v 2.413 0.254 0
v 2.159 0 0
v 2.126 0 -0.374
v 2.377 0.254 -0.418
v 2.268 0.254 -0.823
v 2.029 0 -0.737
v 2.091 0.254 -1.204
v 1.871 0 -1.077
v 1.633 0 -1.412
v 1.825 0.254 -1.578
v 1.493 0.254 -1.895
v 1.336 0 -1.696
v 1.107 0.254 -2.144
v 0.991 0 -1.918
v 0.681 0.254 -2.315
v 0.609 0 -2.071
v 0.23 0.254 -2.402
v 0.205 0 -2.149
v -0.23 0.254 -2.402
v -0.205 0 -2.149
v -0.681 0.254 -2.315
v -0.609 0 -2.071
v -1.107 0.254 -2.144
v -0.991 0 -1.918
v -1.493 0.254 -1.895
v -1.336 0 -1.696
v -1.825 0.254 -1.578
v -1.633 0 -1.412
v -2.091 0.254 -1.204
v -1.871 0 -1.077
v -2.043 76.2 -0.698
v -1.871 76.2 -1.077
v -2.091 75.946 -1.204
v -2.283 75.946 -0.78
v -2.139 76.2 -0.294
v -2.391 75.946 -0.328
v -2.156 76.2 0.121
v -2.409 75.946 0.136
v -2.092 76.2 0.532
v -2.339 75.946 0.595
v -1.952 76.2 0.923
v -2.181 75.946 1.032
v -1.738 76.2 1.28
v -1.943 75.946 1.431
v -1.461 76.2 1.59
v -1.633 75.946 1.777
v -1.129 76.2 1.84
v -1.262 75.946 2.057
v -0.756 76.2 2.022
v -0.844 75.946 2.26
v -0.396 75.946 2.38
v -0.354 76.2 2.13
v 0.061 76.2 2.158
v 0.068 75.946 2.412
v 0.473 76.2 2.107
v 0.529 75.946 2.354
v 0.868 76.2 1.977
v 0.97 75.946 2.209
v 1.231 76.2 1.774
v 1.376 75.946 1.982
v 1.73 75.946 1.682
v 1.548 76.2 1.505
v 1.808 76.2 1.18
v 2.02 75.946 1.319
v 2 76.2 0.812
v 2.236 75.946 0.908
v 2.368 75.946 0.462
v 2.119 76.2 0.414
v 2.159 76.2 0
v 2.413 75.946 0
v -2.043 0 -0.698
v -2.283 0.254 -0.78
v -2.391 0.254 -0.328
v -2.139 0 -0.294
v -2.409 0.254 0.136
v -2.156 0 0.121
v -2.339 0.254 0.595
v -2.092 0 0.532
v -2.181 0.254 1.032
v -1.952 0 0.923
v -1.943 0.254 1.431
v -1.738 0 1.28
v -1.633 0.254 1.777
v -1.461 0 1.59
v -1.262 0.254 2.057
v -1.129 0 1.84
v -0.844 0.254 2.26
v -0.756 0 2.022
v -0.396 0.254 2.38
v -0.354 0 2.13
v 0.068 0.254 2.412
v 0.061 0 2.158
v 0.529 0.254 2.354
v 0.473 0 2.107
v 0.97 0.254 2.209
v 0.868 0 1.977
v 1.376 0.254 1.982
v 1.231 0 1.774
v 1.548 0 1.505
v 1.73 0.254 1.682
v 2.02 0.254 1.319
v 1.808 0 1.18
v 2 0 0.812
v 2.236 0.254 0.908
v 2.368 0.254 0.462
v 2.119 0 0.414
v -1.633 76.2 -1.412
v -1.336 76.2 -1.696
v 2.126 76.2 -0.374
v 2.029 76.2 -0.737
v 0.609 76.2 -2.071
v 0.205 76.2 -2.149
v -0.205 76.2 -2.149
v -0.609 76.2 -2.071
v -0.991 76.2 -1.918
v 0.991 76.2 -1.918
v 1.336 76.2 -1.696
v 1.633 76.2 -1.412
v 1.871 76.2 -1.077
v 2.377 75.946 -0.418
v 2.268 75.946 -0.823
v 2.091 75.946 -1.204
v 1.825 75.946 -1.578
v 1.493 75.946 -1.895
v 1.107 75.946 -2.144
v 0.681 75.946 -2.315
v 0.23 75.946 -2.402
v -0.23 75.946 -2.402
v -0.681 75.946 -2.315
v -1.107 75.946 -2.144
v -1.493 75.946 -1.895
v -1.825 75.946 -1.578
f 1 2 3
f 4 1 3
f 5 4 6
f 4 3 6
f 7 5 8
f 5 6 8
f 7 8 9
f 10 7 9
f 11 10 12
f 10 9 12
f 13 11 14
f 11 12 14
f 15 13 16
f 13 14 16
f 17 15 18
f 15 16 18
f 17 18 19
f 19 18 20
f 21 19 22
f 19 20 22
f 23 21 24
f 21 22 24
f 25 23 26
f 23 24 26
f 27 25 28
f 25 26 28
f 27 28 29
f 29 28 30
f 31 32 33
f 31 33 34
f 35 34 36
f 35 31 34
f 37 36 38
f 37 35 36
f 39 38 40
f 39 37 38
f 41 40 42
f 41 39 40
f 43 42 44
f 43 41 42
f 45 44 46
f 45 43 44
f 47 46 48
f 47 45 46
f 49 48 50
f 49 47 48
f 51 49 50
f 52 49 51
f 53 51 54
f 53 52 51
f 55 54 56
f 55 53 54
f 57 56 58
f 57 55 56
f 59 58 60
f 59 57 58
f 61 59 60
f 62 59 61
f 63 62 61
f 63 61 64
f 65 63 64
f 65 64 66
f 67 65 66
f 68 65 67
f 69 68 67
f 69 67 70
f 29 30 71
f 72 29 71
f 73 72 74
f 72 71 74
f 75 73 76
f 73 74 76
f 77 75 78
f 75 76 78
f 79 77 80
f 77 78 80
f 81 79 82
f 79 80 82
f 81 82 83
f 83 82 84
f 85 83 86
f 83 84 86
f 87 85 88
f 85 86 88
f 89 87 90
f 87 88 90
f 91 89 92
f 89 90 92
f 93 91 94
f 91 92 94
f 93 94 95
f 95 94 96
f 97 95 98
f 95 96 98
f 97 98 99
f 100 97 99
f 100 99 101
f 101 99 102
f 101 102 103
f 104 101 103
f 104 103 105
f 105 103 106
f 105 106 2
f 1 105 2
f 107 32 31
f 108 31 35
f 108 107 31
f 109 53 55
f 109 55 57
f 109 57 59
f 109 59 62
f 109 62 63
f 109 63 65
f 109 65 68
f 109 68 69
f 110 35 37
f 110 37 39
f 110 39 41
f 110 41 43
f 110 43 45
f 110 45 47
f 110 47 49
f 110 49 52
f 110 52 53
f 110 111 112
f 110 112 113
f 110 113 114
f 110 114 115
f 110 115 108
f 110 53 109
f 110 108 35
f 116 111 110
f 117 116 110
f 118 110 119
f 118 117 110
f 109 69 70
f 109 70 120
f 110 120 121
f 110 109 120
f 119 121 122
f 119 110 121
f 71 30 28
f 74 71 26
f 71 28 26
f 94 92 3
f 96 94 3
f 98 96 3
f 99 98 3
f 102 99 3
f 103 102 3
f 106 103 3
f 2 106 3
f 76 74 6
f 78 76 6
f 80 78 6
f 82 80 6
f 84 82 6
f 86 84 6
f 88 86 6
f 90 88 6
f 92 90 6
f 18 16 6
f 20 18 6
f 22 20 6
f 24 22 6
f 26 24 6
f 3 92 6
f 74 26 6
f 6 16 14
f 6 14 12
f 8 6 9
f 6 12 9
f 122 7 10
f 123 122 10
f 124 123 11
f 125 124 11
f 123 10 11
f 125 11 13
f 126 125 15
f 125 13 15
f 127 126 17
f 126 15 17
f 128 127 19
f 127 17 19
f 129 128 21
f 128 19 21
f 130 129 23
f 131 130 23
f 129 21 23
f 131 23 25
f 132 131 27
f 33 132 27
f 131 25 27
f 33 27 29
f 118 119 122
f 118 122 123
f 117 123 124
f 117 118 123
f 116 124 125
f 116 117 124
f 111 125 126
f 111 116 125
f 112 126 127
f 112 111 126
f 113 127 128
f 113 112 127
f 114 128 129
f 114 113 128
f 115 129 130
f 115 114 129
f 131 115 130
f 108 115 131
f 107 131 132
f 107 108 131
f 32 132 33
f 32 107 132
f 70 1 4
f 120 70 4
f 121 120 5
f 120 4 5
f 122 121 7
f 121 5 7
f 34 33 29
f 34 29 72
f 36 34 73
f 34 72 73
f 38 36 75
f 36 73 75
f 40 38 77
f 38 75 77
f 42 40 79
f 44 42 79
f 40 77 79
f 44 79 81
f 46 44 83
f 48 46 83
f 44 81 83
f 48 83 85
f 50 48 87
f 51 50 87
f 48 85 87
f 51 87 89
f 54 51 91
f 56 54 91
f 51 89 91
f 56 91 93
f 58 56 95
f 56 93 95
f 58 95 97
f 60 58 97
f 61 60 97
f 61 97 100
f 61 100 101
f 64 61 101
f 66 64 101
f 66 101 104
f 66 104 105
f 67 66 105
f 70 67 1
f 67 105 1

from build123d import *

# Parameters (mm, degrees)
BOSS_EXTRUDE1_DEPTH = 76.2
CHAMFER1_SIZE       = 0.254


with BuildPart() as part:
    # Sketch1 → Boss-Extrude1 (new body)
    with BuildSketch(Plane(origin=(0, 0, 0), x_dir=(1, 0, 0), z_dir=(0, 1, 0))):
        with BuildLine():
            ThreePointArc((2.091397583, 1.203588447), (0, 2.413), (-2.091397583, 1.203588447))
            Line((-2.091397583, 1.203588447), (2.091397583, 1.203588447))
        make_face()
        with BuildLine():
            Line((2.091397583, 1.203588447), (-2.091397583, 1.203588447))
            ThreePointArc((-2.091397583, 1.203588447), (-0.622907149, -2.33121335), (2.413, 0))
            ThreePointArc((2.413, 0), (2.33121335, 0.622907149), (2.091397583, 1.203588447))
        make_face()
    extrude(amount=BOSS_EXTRUDE1_DEPTH)

    # Chamfer1
    chamfer1_edges = [part.edges().sort_by_distance(p)[0] for p in [
        (-2.091397583, 0, 1.203588447),
        (-2.091397583, 76.2, 1.203588447),
    ]]
    chamfer(chamfer1_edges, length=CHAMFER1_SIZE)


solid = part.part
